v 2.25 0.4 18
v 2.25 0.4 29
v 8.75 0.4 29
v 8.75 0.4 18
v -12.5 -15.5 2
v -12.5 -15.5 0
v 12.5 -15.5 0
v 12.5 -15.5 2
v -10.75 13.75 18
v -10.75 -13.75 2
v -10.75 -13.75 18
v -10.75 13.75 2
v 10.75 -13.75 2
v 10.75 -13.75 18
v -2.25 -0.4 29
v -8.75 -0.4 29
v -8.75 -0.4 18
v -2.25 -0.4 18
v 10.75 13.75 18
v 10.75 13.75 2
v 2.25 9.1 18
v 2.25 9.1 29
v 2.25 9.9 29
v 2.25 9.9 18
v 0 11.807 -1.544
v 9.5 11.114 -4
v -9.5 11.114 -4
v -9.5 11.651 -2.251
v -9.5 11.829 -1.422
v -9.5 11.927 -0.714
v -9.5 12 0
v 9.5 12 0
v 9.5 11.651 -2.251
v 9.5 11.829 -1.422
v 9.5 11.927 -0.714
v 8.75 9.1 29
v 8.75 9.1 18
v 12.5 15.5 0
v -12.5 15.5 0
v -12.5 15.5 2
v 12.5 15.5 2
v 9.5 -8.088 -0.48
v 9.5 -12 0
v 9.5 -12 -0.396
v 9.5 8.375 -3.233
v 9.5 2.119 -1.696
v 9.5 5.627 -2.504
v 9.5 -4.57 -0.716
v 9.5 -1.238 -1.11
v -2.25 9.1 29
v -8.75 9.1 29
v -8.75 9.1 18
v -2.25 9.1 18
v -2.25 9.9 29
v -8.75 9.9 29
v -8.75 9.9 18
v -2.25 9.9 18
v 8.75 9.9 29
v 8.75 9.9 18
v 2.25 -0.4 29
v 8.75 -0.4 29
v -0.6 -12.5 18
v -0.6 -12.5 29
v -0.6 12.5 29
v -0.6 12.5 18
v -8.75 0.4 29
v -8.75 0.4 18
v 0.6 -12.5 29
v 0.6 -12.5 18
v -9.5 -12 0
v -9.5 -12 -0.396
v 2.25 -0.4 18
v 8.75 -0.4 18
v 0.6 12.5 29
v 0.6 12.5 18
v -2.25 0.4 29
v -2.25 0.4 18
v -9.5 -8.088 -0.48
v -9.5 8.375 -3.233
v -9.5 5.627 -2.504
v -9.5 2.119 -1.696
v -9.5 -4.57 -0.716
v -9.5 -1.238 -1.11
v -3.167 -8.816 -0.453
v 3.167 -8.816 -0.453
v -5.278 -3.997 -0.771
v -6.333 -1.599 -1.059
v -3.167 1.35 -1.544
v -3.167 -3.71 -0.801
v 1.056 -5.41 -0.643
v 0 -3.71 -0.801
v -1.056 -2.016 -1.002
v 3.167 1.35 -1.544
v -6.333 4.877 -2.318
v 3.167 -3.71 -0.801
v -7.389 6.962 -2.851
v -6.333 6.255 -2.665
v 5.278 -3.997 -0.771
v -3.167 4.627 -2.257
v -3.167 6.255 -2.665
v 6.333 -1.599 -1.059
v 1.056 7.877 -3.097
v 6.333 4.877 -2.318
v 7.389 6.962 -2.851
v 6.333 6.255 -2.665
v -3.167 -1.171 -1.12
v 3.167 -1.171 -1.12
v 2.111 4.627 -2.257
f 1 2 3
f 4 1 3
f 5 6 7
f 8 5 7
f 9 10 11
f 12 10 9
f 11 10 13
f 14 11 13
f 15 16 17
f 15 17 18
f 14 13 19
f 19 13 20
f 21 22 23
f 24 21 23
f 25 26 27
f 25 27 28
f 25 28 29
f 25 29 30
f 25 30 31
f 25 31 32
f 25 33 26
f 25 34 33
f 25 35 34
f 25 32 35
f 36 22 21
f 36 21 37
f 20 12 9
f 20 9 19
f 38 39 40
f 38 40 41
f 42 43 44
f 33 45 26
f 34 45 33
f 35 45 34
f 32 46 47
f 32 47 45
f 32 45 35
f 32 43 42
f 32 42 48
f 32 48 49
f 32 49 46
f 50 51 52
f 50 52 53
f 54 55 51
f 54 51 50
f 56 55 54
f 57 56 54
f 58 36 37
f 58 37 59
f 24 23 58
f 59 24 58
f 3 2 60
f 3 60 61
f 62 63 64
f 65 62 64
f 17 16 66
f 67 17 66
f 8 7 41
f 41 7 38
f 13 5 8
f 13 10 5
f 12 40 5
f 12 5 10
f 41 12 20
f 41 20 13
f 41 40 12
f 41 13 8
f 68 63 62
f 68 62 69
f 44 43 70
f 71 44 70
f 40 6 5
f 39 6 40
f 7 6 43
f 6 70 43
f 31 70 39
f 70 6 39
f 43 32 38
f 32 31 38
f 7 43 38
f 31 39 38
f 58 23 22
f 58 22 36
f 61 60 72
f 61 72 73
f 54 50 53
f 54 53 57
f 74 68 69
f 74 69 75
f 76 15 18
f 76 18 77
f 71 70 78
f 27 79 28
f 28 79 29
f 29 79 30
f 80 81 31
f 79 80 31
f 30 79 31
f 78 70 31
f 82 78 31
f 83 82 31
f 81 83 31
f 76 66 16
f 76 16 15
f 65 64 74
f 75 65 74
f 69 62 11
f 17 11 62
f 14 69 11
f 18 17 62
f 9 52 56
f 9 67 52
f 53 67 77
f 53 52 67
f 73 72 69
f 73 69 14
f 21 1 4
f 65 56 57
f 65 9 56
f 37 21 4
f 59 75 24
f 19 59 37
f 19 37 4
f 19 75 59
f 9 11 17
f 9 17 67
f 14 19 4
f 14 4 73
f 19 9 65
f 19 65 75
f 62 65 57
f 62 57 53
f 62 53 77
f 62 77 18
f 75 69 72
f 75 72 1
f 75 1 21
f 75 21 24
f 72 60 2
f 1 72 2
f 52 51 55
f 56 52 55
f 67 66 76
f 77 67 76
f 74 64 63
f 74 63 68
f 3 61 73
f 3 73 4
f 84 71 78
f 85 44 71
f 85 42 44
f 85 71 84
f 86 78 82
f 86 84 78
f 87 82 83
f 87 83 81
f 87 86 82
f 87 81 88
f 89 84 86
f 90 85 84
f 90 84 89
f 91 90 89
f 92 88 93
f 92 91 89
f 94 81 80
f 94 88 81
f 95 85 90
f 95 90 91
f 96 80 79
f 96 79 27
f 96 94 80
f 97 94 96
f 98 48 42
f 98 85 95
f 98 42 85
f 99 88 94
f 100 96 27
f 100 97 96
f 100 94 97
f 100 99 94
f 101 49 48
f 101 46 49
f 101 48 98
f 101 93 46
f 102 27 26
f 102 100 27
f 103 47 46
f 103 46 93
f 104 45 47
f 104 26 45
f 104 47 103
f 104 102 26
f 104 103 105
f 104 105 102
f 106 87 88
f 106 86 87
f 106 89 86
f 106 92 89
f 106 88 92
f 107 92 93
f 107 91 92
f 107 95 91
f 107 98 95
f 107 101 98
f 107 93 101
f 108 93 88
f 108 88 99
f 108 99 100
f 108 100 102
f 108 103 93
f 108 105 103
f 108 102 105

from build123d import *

# Parameters (mm, degrees)
SKETCH_1_W          = 25
SKETCH_1_H          = 31
EXTRUDE_1_DEPTH     = 2
SKETCH_2_W          = 21.5
SKETCH_2_H          = 27.5
EXTRUDE_2_DEPTH     = 27
SKETCH_3_W          = 19
SKETCH_3_H          = 24
EXTRUDE_3_DEPTH     = 4
CUT_EXTRUDE_START   = -19
CUT_EXTRUDE_1_DEPTH = 19
SKETCH_6_W          = 21.5
SKETCH_6_H          = 27.5
SKETCH_6_W_2        = 1.2
SKETCH_6_H_2        = 25
SKETCH_6_W_3        = 6.5
SKETCH_6_H_3        = 0.8
CUT_EXTRUDE_2_DEPTH = 11


# Read off the part's stored shape, not the designer's step: 切除-拉伸1
with BuildPart() as part:
    # 草图1 → 拉伸1 (new body)
    with BuildSketch(Plane.XY):
        Rectangle(SKETCH_1_W, SKETCH_1_H)
    extrude(amount=EXTRUDE_1_DEPTH)

    # 草图2 → 拉伸2 (add)
    with BuildSketch(Plane.XY.offset(2)):
        Rectangle(SKETCH_2_W, SKETCH_2_H)
    extrude(amount=EXTRUDE_2_DEPTH)

    # 草图3 → 拉伸3 (add)
    with BuildSketch(Plane(origin=(0, 0, 0), x_dir=(-1, 0, 0), z_dir=(0, 0, -1))):
        Rectangle(SKETCH_3_W, SKETCH_3_H)
    extrude(amount=EXTRUDE_3_DEPTH)

    # 切除-拉伸1 outline → 切除-拉伸1 (cut)
    with BuildSketch(Plane.ZY.offset(9.5).offset(CUT_EXTRUDE_START)):
        with BuildLine():
            Line((-4, -12), (-0.39560665, -12))
            add(Edge.make_bspline(
                [(-0.39560665, -12), (-0.407203251, -10.938807734), (-0.456034027, -6.470357075), (-1.244501589, 1.361302539), (-3.086230941, 7.87953286), (-4, 11.113535286)],
                knots=[0, 0, 0, 0, 0.135639857, 0.571150042, 1, 1, 1, 1], degree=3))
            Line((-4, 11.113535286), (-4, -12))
        make_face()
        with BuildLine():
            Line((-4, 12), (-4, 11.113535286))
            add(Edge.make_bspline(
                [(-4, 11.113535286), (-3.189353387, 11.383960845), (-1.884330596, 11.819306546), (-0.517710732, 11.950355346), (0, 12)],
                knots=[0, 0, 0, 0, 0.621174296, 1, 1, 1, 1], degree=3))
            Line((0, 12), (-4, 12))
        make_face()
    extrude(amount=CUT_EXTRUDE_1_DEPTH, mode=Mode.SUBTRACT)

    # 草图6 → 切除-拉伸2 (cut)
    with BuildSketch(Plane.XY.offset(29)):
        Rectangle(SKETCH_6_W, SKETCH_6_H)
        Rectangle(SKETCH_6_W_2, SKETCH_6_H_2, mode=Mode.SUBTRACT)
        with Locations((-5.5, 9.5)):
            Rectangle(SKETCH_6_W_3, SKETCH_6_H_3, mode=Mode.SUBTRACT)
        with Locations((5.5, 9.5)):
            Rectangle(SKETCH_6_W_3, SKETCH_6_H_3, mode=Mode.SUBTRACT)
        with Locations((-5.5, 0)):
            Rectangle(SKETCH_6_W_3, SKETCH_6_H_3, mode=Mode.SUBTRACT)
        with Locations((5.5, 0)):
            Rectangle(SKETCH_6_W_3, SKETCH_6_H_3, mode=Mode.SUBTRACT)
    extrude(amount=-CUT_EXTRUDE_2_DEPTH, mode=Mode.SUBTRACT)


solid = part.part
